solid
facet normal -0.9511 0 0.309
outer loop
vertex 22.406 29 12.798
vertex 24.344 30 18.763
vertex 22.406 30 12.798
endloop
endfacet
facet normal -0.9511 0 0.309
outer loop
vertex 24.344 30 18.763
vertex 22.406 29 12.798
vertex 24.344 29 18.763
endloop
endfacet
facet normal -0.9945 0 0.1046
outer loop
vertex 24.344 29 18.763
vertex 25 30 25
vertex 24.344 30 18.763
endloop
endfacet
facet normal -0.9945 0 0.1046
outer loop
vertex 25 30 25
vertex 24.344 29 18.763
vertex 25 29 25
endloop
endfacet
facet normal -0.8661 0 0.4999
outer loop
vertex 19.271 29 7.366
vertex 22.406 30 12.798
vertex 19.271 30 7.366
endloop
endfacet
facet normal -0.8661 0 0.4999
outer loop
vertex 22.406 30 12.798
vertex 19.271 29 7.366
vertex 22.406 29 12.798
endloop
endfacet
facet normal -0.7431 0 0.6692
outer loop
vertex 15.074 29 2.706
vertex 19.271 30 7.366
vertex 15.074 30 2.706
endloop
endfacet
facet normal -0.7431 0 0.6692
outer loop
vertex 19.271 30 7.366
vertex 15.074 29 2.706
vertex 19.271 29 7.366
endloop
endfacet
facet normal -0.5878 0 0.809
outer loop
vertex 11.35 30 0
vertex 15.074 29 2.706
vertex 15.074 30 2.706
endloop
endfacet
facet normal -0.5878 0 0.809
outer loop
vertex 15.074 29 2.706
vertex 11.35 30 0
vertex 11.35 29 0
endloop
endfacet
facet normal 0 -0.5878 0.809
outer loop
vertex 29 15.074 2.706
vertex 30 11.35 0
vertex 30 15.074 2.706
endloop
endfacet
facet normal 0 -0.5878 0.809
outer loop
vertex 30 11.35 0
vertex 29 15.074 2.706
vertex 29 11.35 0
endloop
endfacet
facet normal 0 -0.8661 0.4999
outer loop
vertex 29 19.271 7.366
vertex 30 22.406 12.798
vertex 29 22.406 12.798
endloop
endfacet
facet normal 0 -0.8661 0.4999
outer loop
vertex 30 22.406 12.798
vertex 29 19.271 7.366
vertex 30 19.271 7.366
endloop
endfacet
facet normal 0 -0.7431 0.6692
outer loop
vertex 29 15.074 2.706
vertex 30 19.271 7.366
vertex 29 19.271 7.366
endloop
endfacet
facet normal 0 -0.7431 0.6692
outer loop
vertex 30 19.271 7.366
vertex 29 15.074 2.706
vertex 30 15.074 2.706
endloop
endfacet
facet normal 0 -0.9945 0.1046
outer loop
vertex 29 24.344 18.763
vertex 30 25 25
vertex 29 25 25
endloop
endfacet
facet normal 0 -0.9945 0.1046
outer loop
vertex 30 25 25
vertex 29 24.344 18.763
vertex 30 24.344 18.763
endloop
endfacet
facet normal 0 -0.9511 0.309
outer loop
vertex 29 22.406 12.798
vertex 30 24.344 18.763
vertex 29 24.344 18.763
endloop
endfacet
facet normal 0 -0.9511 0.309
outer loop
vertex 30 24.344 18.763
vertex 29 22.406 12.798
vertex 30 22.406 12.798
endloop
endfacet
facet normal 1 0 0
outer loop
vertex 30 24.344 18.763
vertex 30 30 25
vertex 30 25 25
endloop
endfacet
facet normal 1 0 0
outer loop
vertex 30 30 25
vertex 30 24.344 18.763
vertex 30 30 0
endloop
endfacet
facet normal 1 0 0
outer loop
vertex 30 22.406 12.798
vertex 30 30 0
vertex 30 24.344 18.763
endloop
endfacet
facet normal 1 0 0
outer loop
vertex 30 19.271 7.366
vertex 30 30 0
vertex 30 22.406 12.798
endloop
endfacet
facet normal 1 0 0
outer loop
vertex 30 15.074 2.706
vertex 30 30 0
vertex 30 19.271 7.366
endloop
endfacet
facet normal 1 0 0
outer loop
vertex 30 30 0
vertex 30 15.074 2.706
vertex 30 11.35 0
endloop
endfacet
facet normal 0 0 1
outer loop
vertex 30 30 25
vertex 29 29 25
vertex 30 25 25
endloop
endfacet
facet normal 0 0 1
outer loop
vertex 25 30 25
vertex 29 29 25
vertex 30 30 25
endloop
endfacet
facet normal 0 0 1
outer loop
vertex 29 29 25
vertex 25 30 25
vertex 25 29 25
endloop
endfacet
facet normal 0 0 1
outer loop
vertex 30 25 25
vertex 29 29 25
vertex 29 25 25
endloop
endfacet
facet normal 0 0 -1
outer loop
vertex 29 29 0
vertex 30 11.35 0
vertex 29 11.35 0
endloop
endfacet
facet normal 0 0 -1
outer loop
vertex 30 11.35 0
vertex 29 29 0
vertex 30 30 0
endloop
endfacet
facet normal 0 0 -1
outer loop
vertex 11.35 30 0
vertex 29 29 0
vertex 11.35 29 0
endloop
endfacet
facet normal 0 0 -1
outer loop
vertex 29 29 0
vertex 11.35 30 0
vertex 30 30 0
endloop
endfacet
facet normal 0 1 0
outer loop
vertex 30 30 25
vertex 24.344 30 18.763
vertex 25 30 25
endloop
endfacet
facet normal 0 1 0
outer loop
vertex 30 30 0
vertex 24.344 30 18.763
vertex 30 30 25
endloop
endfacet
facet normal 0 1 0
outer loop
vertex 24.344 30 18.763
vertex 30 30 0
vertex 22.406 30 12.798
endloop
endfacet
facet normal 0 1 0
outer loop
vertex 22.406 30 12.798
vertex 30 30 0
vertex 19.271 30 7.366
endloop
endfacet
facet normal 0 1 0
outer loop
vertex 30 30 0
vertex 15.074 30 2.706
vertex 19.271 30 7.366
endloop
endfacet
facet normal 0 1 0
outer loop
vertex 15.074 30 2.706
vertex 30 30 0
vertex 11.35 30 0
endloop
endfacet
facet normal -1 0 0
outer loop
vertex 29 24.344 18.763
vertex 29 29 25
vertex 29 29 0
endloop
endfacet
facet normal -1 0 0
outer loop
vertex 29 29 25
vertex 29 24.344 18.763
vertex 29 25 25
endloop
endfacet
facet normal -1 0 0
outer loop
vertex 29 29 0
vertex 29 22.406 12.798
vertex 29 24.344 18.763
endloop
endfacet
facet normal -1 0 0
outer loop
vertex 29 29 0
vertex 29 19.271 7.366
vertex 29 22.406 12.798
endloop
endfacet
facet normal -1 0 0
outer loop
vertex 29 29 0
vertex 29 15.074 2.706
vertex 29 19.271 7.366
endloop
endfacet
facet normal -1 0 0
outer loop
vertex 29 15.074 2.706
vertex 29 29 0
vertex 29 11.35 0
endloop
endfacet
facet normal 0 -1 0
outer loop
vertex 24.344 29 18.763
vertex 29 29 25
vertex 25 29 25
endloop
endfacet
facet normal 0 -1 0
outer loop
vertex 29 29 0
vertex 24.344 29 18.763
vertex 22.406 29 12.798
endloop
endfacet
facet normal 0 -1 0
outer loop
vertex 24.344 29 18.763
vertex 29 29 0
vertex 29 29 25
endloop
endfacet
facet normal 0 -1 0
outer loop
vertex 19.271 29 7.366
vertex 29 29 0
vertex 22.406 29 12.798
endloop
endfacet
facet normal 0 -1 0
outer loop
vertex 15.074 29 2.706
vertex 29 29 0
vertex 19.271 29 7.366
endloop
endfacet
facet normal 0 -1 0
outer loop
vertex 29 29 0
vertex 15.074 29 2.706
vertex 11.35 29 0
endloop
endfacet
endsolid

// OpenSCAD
n=5;m=5; d=5; t=1; h=1;

module grid2d()
{
    for(i=[0:n]) translate([d*i,0]) square([t,d*m]);
    for(j=[0:m]) translate([0,d*j]) square([d*n,t]);
    translate([d*n,0]) square([d,d*m+d]);
    translate([0,d*m]) square([d*n+d,d]);
}

module grid(point=true,fancy=true)
{
    linear_extrude(height=h) difference()
    {   union()
        {   grid2d(n=n,m=m,t=t,d=d);
            if(fancy) translate(d*[2,2]) circle(2*d);
        }
        if(fancy) translate(d*[2,2]) circle(2*d-t);
    }
    difference()
    {   cube([n+1,m+1,n]*d);
        translate([-d,-d,n*d]) for(a=[0,-90]) rotate(a)
            rotate([-90,0,0]) cylinder(r=n*d+d,h=8*m*d);
        cube([n*d+d-t,m*d+d-t,2*n*d]);
    }
}

module gridx2()
{   grid(n=2*n-1,m=2*m-1); }

grid();
